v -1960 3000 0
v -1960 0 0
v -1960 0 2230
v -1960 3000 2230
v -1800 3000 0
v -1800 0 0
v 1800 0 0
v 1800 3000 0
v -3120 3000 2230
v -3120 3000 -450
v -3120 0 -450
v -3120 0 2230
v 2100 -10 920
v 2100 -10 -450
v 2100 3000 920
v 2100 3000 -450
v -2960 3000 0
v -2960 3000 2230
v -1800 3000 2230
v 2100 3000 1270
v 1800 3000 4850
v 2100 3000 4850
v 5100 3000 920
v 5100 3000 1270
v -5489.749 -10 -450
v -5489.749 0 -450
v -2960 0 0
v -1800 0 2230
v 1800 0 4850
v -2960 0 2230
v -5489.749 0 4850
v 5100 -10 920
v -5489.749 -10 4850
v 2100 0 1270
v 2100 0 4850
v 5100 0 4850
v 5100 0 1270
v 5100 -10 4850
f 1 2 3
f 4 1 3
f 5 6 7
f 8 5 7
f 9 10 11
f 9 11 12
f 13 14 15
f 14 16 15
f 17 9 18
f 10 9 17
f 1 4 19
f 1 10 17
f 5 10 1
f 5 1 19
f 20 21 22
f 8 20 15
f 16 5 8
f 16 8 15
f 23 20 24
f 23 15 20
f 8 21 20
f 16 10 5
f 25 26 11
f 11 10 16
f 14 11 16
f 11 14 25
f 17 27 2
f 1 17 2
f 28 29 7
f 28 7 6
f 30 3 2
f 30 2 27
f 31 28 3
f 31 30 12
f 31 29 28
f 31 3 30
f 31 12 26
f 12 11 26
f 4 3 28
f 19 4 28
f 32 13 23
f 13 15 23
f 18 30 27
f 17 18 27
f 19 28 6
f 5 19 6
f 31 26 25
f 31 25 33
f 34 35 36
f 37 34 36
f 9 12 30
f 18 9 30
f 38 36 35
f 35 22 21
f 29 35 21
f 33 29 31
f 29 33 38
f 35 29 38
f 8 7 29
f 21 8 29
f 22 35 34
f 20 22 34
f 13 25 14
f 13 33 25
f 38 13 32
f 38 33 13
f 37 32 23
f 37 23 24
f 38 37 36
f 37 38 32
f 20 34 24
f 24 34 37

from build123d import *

# Parameters (mm, degrees)
DODANIE_WYCI_GNI_CIE1_DEPTH = 3000
DODANIE_WYCI_GNI_CIE5_DEPTH = 10
DODANIE_WYCI_GNI_CIE6_DEPTH = 10


with BuildPart() as part:
    # Szkic1 → Dodanie-wyciągnięcie1 (new body)
    with BuildSketch(Plane(origin=(0, 0, 0), x_dir=(1, 0, 0), z_dir=(0, 1, 0))):
        Polygon((-1800, 0), (1800, 0), (1800, -4850), (2100, -4850), (2100, -1270), (5100, -1270), (5100, -920), (2100, -920), (2100, 450), (-3120, 450), (-3120, -2230), (-2960, -2230), (-2960, 0), (-1960, 0), (-1960, -2230), (-1800, -2230), align=None)
    extrude(amount=DODANIE_WYCI_GNI_CIE1_DEPTH)

    # Szkic3 → Dodanie-wyciągnięcie5 (add)
    with BuildSketch(Plane.XZ):
        Polygon((-3120, -450), (-5489.748639645, -450), (-5489.748639645, 4850), (1800, 4850), (1950, 4850), (1950, -450), (1800, -450), align=None)
    extrude(amount=DODANIE_WYCI_GNI_CIE5_DEPTH)

    # Szkic4 → Dodanie-wyciągnięcie6 (add)
    with BuildSketch(Plane.XZ):
        Polygon((1950, -450), (2100, -450), (2100, 920), (5100, 920), (5100, 4850), (1950, 4850), align=None)
    extrude(amount=DODANIE_WYCI_GNI_CIE6_DEPTH)


solid = part.part
